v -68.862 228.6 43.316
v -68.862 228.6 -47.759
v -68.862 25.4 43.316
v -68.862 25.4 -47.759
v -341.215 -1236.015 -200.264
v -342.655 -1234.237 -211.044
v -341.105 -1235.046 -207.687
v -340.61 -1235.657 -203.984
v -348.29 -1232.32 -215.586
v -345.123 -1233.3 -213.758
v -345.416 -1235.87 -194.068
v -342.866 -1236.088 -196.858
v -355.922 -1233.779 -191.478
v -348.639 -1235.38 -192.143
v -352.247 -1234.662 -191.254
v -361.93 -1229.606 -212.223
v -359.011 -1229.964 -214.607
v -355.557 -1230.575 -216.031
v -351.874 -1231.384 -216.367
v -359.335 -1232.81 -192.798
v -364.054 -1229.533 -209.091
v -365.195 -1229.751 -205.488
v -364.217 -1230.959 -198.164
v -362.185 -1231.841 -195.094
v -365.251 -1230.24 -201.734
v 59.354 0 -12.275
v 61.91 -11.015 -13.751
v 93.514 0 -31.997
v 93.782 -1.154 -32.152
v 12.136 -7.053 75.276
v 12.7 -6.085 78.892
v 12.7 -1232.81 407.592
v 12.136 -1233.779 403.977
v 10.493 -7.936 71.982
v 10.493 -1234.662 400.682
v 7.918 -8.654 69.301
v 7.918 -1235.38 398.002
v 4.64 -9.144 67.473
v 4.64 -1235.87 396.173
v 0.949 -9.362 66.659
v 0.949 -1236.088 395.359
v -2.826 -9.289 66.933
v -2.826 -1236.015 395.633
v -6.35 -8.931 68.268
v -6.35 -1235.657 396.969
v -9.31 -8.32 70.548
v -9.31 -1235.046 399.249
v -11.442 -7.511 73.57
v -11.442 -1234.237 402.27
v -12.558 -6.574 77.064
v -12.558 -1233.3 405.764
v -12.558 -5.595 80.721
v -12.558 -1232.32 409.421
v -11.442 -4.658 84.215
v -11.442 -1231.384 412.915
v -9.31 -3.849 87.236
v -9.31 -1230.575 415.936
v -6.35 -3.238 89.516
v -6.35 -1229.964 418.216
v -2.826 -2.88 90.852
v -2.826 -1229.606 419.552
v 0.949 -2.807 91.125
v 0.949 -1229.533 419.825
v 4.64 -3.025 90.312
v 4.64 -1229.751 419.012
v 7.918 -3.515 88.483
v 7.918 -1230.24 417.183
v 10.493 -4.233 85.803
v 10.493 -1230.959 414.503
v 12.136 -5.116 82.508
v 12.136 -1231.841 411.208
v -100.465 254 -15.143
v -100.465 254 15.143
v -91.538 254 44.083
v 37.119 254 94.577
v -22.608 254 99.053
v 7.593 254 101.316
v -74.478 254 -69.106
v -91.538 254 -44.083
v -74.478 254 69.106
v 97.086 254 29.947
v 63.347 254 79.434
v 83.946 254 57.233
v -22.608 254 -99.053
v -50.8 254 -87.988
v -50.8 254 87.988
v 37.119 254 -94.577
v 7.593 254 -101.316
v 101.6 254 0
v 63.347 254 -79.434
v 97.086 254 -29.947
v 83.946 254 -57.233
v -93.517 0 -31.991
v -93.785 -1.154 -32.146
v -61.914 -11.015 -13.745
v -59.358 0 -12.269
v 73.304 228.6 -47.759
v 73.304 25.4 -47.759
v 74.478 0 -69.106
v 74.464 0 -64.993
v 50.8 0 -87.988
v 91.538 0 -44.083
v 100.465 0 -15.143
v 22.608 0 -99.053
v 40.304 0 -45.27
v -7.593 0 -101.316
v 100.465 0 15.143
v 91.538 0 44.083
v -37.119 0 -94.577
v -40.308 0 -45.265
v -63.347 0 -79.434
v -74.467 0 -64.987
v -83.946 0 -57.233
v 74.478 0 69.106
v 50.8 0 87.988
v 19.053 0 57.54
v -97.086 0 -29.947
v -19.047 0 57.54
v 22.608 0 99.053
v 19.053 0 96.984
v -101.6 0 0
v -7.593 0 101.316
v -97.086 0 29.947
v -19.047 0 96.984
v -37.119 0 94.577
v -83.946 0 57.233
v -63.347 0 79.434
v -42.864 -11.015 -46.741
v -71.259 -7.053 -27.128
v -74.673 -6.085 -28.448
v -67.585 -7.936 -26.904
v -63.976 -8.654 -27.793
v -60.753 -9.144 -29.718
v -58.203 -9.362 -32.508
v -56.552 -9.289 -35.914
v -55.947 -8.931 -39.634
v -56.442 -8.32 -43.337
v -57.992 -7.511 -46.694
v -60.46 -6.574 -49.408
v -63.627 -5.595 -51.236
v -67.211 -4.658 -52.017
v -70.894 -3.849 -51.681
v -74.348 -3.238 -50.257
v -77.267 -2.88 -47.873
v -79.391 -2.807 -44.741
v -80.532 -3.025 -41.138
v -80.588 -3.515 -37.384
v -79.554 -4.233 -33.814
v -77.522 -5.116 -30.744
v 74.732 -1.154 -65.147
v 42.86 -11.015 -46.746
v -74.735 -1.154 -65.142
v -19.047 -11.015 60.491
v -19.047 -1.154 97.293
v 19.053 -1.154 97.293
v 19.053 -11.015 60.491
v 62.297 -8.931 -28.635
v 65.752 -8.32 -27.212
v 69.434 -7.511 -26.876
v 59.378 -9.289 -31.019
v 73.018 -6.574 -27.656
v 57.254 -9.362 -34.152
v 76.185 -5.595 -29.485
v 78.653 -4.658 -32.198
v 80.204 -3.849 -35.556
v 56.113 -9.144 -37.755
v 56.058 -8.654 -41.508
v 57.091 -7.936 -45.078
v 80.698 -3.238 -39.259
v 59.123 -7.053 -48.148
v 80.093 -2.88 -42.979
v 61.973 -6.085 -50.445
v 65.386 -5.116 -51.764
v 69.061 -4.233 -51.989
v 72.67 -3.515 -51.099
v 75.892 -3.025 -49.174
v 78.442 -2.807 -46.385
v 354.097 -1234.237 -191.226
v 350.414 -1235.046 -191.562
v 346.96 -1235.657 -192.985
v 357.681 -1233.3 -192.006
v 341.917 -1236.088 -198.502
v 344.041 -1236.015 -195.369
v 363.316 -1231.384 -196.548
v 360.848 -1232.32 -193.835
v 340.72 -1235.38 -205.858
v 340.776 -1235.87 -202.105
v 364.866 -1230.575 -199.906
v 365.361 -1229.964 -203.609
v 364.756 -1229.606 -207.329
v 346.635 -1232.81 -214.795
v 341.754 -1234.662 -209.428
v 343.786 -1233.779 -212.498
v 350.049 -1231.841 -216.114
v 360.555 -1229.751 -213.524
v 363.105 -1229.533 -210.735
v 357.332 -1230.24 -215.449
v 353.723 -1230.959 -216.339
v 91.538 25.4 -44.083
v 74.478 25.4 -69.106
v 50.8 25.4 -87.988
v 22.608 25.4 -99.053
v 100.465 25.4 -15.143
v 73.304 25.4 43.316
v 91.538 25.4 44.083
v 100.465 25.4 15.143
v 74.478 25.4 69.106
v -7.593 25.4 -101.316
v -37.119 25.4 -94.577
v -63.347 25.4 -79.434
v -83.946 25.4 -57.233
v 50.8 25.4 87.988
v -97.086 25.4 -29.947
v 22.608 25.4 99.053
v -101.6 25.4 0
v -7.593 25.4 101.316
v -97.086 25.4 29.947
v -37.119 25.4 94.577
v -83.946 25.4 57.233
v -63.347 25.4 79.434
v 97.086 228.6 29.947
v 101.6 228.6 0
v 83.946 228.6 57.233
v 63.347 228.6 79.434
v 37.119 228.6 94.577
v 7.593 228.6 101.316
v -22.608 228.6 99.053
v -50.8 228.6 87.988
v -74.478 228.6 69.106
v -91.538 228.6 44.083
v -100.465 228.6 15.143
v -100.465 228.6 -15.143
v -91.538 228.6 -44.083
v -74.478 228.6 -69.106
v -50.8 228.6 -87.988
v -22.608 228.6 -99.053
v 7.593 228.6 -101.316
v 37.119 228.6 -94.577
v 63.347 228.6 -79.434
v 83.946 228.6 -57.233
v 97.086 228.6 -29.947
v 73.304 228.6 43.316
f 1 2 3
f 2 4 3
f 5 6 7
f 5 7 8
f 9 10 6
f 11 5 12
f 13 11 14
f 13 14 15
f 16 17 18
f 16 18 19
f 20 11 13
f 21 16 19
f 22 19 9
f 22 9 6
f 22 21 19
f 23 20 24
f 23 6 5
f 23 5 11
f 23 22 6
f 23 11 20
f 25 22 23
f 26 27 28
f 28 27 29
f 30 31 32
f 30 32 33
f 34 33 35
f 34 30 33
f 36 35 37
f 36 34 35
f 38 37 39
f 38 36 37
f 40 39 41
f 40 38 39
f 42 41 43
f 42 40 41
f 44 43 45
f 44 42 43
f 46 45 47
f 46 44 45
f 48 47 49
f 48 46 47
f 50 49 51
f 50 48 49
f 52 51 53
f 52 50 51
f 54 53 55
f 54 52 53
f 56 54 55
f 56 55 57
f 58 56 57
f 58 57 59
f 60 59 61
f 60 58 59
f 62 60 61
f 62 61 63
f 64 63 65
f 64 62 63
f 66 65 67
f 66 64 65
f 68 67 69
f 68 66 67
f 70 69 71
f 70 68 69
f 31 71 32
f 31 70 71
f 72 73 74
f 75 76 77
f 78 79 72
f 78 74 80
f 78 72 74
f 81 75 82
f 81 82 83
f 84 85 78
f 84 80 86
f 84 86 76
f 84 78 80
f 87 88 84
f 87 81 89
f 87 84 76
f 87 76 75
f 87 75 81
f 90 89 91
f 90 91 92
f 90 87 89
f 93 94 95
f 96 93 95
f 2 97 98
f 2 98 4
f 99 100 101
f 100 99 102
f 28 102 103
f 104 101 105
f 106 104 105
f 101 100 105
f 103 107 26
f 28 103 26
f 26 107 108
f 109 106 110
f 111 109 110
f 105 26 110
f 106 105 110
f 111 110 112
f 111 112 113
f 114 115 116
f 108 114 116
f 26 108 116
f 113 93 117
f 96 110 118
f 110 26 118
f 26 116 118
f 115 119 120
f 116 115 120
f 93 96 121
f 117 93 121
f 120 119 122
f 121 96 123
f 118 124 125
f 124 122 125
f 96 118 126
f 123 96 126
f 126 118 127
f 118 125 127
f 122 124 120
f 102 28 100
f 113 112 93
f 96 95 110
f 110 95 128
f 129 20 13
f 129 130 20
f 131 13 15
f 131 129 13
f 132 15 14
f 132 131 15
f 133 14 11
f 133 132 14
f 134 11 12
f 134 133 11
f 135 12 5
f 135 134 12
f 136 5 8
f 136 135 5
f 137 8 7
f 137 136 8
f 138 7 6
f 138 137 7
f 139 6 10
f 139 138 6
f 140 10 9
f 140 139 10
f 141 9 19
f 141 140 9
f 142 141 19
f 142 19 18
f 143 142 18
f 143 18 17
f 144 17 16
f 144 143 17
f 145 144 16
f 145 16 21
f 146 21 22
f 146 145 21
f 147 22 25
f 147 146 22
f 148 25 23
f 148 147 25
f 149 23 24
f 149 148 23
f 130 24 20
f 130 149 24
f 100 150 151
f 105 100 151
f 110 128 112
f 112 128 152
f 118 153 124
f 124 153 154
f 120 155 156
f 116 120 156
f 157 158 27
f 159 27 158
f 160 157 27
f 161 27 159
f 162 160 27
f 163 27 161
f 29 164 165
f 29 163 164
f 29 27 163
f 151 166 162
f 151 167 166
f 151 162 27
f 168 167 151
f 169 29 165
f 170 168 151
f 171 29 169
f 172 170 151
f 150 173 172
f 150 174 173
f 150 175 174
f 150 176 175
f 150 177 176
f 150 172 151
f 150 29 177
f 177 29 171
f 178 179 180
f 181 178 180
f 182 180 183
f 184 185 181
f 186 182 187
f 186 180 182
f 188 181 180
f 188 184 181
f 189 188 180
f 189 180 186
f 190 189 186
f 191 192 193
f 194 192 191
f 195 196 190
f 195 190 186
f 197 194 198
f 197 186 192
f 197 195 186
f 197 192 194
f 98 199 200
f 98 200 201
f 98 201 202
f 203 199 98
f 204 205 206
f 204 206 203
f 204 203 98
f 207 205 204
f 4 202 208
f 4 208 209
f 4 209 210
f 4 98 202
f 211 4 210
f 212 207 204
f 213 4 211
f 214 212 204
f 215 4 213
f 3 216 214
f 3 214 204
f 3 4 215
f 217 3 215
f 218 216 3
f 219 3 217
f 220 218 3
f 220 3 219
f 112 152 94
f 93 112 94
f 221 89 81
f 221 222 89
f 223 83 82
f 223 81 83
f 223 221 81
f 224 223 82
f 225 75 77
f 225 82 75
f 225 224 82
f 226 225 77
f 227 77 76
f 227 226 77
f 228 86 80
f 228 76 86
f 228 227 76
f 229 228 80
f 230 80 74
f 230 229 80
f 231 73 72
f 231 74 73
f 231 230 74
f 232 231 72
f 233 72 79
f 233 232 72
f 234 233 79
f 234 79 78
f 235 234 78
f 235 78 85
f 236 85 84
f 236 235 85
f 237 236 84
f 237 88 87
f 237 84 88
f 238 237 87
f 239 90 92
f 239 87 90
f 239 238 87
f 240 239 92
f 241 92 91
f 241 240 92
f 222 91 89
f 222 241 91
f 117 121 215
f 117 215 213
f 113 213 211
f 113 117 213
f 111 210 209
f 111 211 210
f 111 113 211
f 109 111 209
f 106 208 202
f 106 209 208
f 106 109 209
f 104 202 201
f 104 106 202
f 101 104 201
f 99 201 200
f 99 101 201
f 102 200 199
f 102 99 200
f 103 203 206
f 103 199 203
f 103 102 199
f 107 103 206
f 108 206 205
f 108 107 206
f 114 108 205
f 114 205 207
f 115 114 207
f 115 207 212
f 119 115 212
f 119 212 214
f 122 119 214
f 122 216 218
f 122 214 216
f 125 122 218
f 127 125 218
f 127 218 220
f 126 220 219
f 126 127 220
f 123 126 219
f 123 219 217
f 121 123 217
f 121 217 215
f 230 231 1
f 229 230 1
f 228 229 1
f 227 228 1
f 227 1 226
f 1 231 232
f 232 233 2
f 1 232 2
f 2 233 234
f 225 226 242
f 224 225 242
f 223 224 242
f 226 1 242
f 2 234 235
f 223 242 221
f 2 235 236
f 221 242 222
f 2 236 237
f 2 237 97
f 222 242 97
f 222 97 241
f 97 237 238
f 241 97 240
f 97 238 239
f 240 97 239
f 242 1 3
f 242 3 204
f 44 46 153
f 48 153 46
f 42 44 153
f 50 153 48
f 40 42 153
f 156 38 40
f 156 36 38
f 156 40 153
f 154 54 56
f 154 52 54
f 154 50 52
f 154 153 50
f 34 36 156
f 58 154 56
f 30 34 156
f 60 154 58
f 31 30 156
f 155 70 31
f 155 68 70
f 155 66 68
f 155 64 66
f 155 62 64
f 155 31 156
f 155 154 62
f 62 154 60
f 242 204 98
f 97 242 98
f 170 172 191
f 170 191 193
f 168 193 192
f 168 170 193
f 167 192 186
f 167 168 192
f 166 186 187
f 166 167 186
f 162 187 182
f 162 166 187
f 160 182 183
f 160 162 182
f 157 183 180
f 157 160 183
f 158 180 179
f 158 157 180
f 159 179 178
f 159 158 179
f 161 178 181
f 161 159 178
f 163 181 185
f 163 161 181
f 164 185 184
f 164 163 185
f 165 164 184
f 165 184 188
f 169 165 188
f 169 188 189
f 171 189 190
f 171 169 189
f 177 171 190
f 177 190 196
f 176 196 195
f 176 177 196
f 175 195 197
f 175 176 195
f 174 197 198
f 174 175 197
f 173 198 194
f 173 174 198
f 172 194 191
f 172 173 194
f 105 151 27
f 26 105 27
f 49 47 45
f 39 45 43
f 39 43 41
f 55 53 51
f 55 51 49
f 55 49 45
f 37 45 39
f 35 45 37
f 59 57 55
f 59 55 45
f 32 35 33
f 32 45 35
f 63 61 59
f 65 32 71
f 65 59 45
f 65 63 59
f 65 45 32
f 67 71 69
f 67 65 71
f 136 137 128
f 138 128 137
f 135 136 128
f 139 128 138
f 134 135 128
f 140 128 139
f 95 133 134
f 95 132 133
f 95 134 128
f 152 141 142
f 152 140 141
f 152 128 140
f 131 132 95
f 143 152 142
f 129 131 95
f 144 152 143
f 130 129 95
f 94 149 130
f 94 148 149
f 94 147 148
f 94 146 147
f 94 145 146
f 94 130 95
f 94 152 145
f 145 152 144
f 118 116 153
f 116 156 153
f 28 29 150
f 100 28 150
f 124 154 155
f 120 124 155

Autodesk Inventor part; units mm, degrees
ref_plane "YZ Plane" through (0, 0, 0) normal (1, 0, 0) x (0, 1, 0)
ref_plane "XZ Plane" through (0, 0, 0) normal (0, 1, 0) x (-1, 0, 0)
sketch "Sketch1" plane through (0, 0, 0) normal (0, 1, 0) x (-1, 0, 0)
  circle A0 centre (0, 0) radius 101.6
  dimension "d0" = 203.2
extrude "Extrusion1" add sketch "Sketch1" along normal blind 25.4
sketch "Sketch2" plane through (0, 0, 0) normal (0, -1, 0) x (1, 0, 0)
  circle A0 centre (0, 0) radius 101.6 projected
  point P0 (0, 101.6)
ref_plane "Work Plane1" through (0, 0, 101.6) normal (0, 0, 1) x (1, 0, 0)
sketch "Sketch3" plane through (0, 0, 101.6) normal (0, 0, 1) x (1, 0, 0)
  line L0 (0, 0) -> (50.8, 0) construction
  dimension "d3" = 50.8
ref_plane "Work Plane2" through (0, 0, 101.6) normal (0, -0.9659, 0.2588) x (1, 0, 0)
sketch "Sketch4" plane through (0, 0, 101.6) normal (0, -0.9659, 0.2588) x (1, 0, 0)
  line L0 (-19.0468, -4.4588) -> (19.0532, -4.4588)
  line L1 (19.0532, -4.4588) -> (19.0532, -42.5588)
  line L2 (19.0532, -42.5588) -> (-19.0468, -42.5588)
  line L3 (-19.0468, -42.5588) -> (-19.0468, -4.4588)
  point P0 (0, -98.1381)
  point P1 (0.0032, -0.0121)
  dimension "d5" = 38.1
  dimension "d6" = 38.1
extrude "Extrusion2" add sketch "Sketch4" against normal blind 25.4
sketch "Sketch5" plane through (0, 0, 101.6) normal (0, -0.9659, 0.2588) x (1, 0, 0)
  circle A0 centre (0, -23.5088) radius 12.7
  point P0 (0, -98.1381)
  dimension "d9" = 25.4
extrude "Extrusion3" add sketch "Sketch5" along normal blind 1270
pattern_circular "Circular Pattern2" count 3 over 360 about axis through (0, 0, 0) along (0, 1, 0) of "Extrusion2", "Extrusion3"
sketch "Sketch6" plane through (0, 25.4, 0) normal (0, 1, 0) x (1, 0, 0)
  line L0 (-68.8618, -43.3163) -> (73.3045, -43.3163)
  line L1 (73.3045, -43.3163) -> (73.3045, 47.759)
  line L2 (73.3045, 47.759) -> (-68.8618, 47.759)
  line L3 (-68.8618, 47.759) -> (-68.8618, -43.3163)
extrude "Extrusion4" add sketch "Sketch6" along normal blind 203.2
sketch "Sketch8" plane through (0, 228.6, 0) normal (0, 1, 0) x (1, 0, 0)
  circle A0 centre (0, 0) radius 101.6
  dimension "d23" = 203.2
extrude "Extrusion6" add sketch "Sketch8" along normal blind 25.4
properties part number "totalStation"
